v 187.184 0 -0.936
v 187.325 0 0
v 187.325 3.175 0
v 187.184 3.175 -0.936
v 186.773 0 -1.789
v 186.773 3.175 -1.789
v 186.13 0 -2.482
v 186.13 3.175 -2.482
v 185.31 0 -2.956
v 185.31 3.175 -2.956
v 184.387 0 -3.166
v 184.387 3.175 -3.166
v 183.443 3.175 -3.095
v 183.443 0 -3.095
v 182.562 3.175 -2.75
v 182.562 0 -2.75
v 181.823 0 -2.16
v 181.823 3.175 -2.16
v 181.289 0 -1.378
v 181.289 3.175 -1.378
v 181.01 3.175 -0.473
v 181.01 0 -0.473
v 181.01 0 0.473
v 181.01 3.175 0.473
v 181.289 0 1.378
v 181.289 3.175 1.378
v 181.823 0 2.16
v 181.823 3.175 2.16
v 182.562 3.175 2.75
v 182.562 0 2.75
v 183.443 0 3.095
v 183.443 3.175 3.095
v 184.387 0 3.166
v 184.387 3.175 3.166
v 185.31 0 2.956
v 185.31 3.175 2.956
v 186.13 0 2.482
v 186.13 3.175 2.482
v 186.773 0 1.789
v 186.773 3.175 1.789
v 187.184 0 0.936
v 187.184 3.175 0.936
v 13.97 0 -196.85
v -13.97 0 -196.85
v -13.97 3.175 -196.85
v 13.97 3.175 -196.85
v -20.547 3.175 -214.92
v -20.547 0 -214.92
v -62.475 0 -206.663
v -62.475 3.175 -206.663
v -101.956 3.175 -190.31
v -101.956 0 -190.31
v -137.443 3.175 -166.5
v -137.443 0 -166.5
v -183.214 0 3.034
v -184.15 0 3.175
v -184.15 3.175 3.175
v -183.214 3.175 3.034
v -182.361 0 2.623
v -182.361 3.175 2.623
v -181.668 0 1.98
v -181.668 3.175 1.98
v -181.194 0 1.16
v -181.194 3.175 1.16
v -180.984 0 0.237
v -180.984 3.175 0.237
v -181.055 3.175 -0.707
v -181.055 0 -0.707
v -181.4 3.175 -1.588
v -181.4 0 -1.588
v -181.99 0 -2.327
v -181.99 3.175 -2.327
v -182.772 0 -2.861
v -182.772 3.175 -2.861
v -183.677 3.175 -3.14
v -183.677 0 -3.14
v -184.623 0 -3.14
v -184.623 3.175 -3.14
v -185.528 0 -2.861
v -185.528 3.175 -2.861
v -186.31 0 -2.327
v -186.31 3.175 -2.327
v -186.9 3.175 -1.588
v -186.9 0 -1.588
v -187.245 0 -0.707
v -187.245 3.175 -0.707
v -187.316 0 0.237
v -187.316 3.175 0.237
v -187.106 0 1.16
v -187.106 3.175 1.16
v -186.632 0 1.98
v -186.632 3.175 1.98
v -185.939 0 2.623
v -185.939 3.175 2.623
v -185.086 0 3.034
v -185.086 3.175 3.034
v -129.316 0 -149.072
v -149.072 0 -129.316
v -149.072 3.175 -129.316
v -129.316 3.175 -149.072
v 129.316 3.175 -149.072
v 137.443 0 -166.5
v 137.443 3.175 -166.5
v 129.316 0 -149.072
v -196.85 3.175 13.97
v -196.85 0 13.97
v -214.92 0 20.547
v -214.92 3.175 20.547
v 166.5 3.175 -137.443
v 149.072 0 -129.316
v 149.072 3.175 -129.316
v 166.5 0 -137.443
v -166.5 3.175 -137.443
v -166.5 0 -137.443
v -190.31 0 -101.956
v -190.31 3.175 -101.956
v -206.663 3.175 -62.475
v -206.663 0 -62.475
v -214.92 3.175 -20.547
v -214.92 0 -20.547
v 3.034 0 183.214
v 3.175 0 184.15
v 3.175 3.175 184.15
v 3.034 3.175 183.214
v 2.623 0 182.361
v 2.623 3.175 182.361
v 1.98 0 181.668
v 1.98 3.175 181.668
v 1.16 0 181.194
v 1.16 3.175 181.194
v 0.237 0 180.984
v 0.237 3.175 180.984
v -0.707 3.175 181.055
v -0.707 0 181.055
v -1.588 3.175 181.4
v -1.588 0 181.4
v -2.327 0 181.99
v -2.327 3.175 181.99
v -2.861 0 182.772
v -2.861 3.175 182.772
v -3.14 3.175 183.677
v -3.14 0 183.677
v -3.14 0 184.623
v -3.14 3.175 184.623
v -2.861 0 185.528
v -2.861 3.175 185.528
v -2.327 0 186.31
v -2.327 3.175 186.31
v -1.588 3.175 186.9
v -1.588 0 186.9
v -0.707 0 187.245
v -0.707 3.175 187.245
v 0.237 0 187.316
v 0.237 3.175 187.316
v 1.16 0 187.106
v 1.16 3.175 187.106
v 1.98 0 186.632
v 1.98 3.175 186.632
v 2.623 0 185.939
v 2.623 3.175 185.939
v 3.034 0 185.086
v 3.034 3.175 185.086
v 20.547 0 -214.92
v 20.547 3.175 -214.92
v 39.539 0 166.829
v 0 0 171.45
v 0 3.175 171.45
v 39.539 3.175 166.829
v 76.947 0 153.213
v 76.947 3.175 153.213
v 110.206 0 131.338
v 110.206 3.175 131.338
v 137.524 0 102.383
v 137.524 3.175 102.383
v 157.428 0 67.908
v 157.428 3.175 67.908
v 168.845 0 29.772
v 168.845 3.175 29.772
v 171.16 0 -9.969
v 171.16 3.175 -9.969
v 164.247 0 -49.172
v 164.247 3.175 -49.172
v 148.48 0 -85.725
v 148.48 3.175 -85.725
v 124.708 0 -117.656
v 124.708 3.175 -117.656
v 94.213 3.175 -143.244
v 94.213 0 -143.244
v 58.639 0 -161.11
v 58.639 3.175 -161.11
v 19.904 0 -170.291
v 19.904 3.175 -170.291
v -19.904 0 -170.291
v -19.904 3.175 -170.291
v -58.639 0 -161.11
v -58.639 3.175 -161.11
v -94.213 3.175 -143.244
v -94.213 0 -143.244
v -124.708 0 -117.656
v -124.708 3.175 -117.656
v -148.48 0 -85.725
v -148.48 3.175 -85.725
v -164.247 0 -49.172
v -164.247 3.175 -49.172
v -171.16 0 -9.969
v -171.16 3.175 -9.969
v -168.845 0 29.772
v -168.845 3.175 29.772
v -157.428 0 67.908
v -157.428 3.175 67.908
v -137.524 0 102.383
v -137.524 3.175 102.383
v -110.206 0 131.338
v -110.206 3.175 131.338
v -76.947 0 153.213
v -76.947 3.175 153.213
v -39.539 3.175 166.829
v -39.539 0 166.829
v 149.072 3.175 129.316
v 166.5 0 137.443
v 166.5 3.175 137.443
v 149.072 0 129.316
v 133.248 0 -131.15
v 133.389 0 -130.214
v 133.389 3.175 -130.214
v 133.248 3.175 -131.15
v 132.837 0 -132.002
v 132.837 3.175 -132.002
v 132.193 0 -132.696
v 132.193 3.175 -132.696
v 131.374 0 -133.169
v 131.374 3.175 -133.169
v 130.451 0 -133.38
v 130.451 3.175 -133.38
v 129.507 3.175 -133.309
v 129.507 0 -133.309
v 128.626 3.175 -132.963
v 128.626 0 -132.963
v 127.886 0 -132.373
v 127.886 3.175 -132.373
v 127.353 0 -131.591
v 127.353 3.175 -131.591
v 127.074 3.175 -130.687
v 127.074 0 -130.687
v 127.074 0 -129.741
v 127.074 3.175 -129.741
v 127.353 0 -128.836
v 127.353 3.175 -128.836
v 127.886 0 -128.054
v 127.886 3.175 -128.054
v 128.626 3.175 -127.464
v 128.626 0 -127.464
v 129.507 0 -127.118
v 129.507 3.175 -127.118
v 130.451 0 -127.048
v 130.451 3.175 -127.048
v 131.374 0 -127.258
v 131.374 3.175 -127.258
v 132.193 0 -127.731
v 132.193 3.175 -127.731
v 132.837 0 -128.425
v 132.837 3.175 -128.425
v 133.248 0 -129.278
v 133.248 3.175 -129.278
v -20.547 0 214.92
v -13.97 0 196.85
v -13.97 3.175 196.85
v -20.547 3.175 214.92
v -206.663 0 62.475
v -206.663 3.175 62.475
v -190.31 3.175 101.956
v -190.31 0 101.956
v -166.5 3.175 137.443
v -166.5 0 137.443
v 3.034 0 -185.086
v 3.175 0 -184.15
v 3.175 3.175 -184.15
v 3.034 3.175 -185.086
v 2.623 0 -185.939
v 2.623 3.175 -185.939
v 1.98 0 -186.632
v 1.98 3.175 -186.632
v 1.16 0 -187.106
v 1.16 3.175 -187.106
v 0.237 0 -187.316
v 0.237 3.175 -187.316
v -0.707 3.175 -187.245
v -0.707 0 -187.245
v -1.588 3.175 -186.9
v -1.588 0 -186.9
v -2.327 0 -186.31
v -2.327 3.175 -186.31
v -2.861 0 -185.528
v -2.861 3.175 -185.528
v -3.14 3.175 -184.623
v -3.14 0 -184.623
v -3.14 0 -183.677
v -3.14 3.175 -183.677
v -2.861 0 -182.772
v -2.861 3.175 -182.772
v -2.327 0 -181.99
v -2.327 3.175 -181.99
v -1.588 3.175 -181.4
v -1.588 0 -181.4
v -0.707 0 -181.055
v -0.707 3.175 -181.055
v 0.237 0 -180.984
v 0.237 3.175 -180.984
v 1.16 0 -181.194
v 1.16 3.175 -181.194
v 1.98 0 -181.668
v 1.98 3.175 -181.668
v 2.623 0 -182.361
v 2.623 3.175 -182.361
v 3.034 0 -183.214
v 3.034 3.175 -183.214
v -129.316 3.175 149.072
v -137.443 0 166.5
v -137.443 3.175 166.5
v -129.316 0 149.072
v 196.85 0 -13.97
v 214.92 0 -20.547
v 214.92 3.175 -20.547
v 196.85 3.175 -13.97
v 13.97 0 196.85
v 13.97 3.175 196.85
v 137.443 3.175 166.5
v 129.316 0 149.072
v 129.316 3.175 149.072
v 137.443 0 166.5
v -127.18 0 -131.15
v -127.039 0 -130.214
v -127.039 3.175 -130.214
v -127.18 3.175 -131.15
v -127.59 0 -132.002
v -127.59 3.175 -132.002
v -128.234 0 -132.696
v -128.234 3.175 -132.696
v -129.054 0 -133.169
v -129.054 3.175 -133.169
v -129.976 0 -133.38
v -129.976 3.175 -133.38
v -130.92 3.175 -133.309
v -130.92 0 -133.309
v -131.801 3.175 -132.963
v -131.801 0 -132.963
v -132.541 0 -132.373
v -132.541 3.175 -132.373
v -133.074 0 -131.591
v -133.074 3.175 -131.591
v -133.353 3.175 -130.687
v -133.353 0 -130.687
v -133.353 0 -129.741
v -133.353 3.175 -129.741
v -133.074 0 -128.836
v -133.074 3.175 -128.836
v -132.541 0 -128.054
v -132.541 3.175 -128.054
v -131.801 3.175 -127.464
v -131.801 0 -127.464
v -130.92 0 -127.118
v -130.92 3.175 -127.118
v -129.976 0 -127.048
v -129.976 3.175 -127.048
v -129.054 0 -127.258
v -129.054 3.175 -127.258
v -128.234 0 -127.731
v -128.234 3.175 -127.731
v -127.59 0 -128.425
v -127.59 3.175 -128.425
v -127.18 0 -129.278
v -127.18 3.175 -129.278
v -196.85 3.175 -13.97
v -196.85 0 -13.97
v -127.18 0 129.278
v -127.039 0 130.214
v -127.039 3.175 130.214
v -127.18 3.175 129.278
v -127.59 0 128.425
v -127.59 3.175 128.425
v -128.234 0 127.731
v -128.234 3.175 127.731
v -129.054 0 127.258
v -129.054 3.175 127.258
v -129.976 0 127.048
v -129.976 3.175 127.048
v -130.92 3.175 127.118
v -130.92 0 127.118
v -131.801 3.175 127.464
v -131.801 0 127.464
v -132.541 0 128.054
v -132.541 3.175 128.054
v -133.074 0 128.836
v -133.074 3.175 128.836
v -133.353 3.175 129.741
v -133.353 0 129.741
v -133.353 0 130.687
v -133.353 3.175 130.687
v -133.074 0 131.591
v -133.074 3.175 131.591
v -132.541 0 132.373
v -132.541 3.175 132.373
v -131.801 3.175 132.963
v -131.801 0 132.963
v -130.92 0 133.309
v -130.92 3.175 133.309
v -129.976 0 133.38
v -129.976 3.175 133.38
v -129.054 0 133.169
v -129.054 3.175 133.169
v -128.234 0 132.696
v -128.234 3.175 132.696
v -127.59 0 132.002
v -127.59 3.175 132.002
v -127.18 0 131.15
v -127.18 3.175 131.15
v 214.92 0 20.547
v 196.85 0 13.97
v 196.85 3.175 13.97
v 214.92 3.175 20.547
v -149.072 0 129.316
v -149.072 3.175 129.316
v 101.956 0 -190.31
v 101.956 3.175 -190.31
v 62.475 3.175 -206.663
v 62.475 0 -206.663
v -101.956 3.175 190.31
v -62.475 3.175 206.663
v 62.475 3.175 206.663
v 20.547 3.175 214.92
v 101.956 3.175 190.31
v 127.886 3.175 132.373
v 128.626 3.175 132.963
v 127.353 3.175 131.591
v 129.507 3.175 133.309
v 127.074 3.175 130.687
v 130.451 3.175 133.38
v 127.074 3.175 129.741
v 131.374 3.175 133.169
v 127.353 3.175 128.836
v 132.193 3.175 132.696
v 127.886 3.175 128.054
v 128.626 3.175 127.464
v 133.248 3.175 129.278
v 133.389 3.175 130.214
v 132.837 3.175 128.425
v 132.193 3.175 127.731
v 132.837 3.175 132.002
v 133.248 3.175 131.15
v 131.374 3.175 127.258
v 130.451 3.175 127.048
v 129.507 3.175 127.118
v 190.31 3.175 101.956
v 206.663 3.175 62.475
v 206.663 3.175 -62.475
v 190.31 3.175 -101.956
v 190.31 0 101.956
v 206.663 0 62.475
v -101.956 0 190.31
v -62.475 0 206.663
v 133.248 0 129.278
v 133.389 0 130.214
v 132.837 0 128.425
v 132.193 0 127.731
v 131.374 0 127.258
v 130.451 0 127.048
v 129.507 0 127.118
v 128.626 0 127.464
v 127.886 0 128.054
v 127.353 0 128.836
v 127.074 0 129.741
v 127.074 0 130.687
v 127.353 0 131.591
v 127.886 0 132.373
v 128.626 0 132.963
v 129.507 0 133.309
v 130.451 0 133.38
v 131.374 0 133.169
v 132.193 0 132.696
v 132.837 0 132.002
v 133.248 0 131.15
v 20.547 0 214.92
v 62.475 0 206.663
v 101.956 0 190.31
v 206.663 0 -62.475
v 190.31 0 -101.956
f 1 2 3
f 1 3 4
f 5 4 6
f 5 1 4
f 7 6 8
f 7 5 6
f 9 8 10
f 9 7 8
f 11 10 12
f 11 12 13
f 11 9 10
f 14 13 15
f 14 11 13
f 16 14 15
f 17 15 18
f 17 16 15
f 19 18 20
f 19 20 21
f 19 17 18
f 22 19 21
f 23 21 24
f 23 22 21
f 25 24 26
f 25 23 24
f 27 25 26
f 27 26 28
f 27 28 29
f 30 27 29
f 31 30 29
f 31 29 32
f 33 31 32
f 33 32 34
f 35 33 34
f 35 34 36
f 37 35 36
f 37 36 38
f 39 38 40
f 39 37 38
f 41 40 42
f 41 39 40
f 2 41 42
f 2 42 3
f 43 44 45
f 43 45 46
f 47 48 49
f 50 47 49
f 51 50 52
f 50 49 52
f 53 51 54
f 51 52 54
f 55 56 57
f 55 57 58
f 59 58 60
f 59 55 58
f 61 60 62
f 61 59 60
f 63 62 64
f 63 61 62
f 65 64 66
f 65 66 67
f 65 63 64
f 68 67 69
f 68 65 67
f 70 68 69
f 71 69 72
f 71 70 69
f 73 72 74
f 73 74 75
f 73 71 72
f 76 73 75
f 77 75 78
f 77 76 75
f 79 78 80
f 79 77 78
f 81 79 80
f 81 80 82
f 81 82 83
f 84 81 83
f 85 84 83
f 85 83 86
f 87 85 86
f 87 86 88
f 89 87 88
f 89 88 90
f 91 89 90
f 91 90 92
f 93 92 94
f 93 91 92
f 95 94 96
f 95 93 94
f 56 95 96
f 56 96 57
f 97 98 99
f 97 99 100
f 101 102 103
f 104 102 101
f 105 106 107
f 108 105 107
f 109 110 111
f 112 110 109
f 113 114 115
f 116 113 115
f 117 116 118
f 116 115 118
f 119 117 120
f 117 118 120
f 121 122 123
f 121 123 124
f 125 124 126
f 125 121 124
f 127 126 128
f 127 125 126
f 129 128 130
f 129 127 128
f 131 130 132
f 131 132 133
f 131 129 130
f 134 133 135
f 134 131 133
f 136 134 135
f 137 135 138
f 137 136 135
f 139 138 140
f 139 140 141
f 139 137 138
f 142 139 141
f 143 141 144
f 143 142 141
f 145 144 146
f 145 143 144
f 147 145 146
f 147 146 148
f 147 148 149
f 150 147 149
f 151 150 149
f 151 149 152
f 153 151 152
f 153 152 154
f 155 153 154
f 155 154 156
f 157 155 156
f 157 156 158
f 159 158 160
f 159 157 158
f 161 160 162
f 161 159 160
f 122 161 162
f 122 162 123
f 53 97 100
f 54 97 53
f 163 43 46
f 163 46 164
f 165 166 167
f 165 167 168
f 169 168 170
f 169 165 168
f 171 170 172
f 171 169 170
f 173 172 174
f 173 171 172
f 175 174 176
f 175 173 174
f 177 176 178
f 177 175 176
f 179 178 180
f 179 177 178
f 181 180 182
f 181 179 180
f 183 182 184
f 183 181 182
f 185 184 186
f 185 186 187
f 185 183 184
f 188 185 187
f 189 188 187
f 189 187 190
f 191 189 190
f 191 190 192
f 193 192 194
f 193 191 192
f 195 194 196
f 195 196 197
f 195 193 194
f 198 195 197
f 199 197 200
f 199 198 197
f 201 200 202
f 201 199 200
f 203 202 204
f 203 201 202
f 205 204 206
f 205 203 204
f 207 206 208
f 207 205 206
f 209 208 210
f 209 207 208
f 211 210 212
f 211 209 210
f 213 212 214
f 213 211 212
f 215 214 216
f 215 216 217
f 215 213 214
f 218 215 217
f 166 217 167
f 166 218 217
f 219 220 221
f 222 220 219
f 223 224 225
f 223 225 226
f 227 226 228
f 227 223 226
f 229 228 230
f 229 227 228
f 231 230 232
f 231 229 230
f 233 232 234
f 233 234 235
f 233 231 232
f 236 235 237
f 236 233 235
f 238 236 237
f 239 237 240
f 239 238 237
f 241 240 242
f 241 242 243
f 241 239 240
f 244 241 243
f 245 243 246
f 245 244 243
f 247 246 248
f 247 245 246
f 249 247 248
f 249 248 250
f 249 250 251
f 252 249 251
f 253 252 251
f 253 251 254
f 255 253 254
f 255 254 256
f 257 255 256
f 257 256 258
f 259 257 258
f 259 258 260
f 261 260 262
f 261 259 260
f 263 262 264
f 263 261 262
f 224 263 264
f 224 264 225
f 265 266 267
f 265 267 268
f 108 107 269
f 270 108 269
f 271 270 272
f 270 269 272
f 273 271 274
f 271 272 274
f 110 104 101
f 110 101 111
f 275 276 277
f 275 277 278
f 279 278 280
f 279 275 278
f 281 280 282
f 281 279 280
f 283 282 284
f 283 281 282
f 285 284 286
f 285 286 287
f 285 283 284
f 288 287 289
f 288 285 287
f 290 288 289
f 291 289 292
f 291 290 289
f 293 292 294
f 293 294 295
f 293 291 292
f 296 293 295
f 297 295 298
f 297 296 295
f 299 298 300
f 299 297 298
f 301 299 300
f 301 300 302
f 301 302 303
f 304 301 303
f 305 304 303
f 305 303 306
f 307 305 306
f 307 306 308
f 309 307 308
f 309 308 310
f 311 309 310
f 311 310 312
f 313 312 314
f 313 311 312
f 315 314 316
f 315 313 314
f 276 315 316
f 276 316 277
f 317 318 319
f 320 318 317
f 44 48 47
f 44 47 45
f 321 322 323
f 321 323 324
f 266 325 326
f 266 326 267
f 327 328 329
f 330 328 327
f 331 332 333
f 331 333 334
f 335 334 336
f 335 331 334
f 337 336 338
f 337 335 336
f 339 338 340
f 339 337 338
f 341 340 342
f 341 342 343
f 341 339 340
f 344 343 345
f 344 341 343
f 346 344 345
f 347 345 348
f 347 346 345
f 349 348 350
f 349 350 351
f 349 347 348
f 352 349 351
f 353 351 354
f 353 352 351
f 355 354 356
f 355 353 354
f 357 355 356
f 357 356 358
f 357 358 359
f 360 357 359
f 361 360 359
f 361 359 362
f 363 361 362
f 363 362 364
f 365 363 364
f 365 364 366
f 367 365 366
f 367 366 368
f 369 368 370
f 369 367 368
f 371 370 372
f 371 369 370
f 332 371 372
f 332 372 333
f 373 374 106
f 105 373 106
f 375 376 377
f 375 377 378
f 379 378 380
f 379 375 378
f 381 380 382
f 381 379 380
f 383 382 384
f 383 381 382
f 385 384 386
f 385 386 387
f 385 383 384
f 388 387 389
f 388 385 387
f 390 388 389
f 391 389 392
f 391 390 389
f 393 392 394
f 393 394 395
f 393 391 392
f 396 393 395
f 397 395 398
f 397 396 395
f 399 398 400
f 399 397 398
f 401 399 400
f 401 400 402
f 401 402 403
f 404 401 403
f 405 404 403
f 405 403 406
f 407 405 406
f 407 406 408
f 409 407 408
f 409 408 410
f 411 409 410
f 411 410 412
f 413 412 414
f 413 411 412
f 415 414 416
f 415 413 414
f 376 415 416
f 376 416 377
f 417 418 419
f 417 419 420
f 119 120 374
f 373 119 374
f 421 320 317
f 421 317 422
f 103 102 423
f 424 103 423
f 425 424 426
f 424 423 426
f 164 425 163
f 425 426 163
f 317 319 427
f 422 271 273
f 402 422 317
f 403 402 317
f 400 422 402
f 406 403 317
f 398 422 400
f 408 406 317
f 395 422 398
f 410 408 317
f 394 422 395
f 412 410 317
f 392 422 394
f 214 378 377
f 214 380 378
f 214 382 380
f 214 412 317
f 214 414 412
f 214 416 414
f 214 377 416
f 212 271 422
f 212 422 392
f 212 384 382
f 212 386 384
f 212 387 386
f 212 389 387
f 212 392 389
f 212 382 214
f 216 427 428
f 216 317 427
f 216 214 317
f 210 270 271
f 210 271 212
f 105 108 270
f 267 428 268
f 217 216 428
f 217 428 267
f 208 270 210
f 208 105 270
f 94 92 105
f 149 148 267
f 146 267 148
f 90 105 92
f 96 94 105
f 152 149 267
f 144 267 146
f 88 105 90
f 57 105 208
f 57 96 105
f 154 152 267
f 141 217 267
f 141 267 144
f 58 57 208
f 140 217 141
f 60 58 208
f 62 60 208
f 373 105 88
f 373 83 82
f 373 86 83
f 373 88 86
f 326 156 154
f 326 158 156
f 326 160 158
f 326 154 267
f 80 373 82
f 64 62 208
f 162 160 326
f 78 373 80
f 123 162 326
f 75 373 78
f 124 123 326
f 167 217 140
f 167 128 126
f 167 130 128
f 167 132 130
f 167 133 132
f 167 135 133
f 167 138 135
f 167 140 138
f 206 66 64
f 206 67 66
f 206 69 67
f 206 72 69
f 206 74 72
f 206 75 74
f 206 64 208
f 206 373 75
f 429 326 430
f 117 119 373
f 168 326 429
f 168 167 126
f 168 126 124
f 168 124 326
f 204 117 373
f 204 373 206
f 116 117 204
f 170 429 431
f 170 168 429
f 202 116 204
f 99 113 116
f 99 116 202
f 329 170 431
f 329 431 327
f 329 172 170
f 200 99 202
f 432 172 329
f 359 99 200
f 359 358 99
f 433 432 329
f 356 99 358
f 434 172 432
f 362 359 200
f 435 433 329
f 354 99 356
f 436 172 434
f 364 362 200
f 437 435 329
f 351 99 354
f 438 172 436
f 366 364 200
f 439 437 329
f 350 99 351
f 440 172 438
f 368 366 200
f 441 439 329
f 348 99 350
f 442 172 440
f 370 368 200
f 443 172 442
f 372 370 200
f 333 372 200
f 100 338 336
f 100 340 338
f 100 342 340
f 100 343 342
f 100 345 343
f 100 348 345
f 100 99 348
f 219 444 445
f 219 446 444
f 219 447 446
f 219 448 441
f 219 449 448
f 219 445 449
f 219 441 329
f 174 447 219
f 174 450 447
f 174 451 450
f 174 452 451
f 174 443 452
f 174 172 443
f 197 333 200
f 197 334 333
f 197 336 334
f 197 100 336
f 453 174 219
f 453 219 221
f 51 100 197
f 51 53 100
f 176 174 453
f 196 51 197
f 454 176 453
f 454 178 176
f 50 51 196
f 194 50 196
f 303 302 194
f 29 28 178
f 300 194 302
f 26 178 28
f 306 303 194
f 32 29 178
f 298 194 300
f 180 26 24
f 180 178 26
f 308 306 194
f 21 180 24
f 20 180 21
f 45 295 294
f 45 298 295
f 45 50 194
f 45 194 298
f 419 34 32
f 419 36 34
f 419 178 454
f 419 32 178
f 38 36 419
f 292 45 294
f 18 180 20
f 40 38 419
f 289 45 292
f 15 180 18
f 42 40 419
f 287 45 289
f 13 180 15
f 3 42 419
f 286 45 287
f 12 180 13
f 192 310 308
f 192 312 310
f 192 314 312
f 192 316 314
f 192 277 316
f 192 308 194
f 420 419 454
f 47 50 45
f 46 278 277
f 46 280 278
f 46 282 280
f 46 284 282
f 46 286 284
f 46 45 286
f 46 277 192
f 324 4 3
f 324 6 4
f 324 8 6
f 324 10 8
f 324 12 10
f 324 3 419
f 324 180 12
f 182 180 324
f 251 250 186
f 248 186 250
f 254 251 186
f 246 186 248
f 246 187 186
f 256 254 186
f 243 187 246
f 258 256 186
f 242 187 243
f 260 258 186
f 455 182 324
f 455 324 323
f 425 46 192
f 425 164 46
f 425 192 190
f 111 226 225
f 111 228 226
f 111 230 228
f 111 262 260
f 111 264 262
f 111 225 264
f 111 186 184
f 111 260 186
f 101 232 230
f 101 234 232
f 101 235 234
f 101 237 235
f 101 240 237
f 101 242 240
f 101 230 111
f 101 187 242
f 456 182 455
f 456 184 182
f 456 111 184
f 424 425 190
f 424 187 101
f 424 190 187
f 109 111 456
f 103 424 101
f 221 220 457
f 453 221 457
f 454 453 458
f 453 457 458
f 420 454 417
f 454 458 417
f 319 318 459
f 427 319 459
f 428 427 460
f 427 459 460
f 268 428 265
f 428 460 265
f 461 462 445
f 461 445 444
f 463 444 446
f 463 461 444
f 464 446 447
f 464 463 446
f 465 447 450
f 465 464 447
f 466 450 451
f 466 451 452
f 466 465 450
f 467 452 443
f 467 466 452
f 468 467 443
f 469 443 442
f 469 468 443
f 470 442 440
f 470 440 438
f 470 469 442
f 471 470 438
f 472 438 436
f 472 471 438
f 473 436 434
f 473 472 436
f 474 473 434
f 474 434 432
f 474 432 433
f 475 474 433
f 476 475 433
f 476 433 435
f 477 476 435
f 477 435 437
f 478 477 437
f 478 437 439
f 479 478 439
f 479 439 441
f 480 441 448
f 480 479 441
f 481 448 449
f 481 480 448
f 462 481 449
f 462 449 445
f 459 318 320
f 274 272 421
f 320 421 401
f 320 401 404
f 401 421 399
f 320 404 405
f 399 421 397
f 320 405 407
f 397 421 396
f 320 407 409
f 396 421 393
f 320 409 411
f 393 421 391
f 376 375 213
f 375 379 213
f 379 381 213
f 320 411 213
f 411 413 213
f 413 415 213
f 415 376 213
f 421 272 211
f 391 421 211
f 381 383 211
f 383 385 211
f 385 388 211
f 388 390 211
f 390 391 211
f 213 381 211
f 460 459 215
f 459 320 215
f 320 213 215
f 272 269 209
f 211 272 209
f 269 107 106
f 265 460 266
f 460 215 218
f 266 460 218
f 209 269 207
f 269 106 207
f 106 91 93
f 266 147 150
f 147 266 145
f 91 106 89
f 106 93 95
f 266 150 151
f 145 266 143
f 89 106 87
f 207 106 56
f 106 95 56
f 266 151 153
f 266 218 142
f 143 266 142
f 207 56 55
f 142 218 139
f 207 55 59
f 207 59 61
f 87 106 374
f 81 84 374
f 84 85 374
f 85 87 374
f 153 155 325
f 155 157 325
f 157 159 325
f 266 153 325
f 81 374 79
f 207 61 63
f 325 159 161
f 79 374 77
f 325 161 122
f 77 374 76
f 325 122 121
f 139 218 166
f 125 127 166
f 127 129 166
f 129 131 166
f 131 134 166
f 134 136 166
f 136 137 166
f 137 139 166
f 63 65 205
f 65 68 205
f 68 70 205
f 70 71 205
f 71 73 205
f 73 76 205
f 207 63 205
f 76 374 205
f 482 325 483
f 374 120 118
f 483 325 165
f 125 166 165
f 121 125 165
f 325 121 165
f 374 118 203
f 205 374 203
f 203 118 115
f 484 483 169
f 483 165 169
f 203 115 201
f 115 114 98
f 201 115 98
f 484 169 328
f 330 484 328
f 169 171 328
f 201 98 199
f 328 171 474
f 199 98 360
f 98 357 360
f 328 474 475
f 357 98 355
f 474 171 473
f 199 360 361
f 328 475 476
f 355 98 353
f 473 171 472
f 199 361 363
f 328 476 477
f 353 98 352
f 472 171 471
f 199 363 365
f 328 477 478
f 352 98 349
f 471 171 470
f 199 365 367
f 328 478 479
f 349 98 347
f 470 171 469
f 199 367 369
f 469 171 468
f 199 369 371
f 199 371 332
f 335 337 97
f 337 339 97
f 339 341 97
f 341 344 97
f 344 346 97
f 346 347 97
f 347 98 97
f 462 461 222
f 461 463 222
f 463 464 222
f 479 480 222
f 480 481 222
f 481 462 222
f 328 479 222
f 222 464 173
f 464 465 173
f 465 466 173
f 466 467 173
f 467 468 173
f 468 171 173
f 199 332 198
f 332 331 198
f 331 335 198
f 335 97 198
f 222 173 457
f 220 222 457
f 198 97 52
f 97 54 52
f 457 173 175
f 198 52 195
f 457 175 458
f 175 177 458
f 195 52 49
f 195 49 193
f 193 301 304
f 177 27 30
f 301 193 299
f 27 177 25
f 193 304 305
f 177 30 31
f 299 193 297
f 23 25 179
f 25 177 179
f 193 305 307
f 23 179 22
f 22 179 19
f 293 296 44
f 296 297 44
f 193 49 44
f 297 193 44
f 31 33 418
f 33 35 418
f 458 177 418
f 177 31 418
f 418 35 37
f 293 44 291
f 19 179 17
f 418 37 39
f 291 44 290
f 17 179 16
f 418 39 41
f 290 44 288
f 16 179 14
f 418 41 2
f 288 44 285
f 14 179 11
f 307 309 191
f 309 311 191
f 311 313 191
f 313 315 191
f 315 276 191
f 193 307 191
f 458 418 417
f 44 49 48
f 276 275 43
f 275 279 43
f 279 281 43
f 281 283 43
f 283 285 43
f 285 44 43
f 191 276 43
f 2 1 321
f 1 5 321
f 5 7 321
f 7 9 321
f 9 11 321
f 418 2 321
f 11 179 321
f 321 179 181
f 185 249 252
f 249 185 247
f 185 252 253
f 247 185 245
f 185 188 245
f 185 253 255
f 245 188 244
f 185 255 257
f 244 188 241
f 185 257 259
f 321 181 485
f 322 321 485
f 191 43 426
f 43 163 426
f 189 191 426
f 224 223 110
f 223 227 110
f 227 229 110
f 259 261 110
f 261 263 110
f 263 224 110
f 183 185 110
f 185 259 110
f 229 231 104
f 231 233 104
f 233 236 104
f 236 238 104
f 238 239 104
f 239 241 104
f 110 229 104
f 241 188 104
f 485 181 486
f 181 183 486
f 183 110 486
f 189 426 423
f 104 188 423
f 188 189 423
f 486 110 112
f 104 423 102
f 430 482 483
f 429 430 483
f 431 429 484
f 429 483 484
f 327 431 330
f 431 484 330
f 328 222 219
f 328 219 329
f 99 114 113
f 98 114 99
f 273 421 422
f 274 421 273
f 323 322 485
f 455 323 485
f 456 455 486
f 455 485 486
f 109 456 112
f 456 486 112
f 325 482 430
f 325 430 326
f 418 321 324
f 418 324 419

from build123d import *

# Parameters (mm, degrees)
SKETCH2_R             = 3.175
SKETCH2_R_2           = 171.45
BOSS_EXTRUDE1_DEPTH   = 3.175
CIRPATTERN1_OUTLINE_R = 3.175
CIRPATTERN1_DEPTH     = 3.175


# Read off the part's stored shape, not the designer's step: CirPattern1
with BuildPart() as part:
    # Sketch2 → Boss-Extrude1 (new body)
    with BuildSketch(Plane(origin=(0, 0, 0), x_dir=(1, 0, 0), z_dir=(0, 1, 0))):
        with BuildLine():
            Line((-214.920060182, 20.546964038), (-196.85, 13.97))
            Line((-196.85, 13.97), (-196.85, -13.97))
            Line((-196.85, -13.97), (-214.920060182, -20.546964038))
            ThreePointArc((-214.920060182, -20.546964038), (10.285159372, -215.654875894), (215.9, 0))
            ThreePointArc((215.9, 0), (10.285159372, 215.654875894), (-214.920060182, 20.546964038))
        make_face()
        with Locations(Location((-184.15, 0, 0), (0, 0, 270))):
            Circle(SKETCH2_R, mode=Mode.SUBTRACT)
        with Locations(Location((0, 0, 0), (0, 0, 270))):
            Circle(SKETCH2_R_2, mode=Mode.SUBTRACT)
    extrude(amount=BOSS_EXTRUDE1_DEPTH)

    # CirPattern1 outline → CirPattern1 (cut)
    with BuildSketch(Plane(origin=(0, 0, 0), x_dir=(1, 0, 0), z_dir=(0, 1, 0))):
        with BuildLine():
            Line((-129.315688143, 149.07225161), (-137.442534364, 166.500329572))
            ThreePointArc((-137.442534364, 166.500329572), (-152.664354058, 152.664354058), (-166.500329572, 137.442534364))
            Line((-166.500329572, 137.442534364), (-149.07225161, 129.315688143))
            Line((-149.07225161, 129.315688143), (-129.315688143, 149.07225161))
        make_face()
        with BuildLine():
            ThreePointArc((-166.500329572, -137.442534364), (-152.664354058, -152.664354058), (-137.442534364, -166.500329572))
            Line((-137.442534364, -166.500329572), (-129.315688143, -149.07225161))
            Line((-129.315688143, -149.07225161), (-149.07225161, -129.315688143))
            Line((-149.07225161, -129.315688143), (-166.500329572, -137.442534364))
        make_face()
        with BuildLine():
            ThreePointArc((-20.546964038, -214.920060182), (0, -215.9), (20.546964038, -214.920060182))
            Line((20.546964038, -214.920060182), (13.97, -196.85))
            Line((13.97, -196.85), (-13.97, -196.85))
            Line((-13.97, -196.85), (-20.546964038, -214.920060182))
        make_face()
        with BuildLine():
            ThreePointArc((137.442534364, -166.500329572), (152.664354058, -152.664354058), (166.500329572, -137.442534364))
            Line((166.500329572, -137.442534364), (149.07225161, -129.315688143))
            Line((149.07225161, -129.315688143), (129.315688143, -149.07225161))
            Line((129.315688143, -149.07225161), (137.442534364, -166.500329572))
        make_face()
        with BuildLine():
            ThreePointArc((214.920060182, -20.546964038), (215.9, 0), (214.920060182, 20.546964038))
            Line((214.920060182, 20.546964038), (196.85, 13.97))
            Line((196.85, 13.97), (196.85, -13.97))
            Line((196.85, -13.97), (214.920060182, -20.546964038))
        make_face()
        with BuildLine():
            ThreePointArc((166.500329572, 137.442534364), (152.664354058, 152.664354058), (137.442534364, 166.500329572))
            Line((137.442534364, 166.500329572), (129.315688143, 149.07225161))
            Line((129.315688143, 149.07225161), (149.07225161, 129.315688143))
            Line((149.07225161, 129.315688143), (166.500329572, 137.442534364))
        make_face()
        with BuildLine():
            ThreePointArc((20.546964038, 214.920060182), (0, 215.9), (-20.546964038, 214.920060182))
            Line((-20.546964038, 214.920060182), (-13.97, 196.85))
            Line((-13.97, 196.85), (13.97, 196.85))
            Line((13.97, 196.85), (20.546964038, 214.920060182))
        make_face()
        with Locations((-130.213713756, 130.213713756)):
            Circle(CIRPATTERN1_OUTLINE_R)
        with Locations((0, 184.15)):
            Circle(CIRPATTERN1_OUTLINE_R)
        with Locations((130.213713756, 130.213713756)):
            Circle(CIRPATTERN1_OUTLINE_R)
        with Locations((184.15, 0)):
            Circle(CIRPATTERN1_OUTLINE_R)
        with Locations((130.213713756, -130.213713756)):
            Circle(CIRPATTERN1_OUTLINE_R)
        with Locations((0, -184.15)):
            Circle(CIRPATTERN1_OUTLINE_R)
        with Locations((-130.213713756, -130.213713756)):
            Circle(CIRPATTERN1_OUTLINE_R)
    extrude(amount=CIRPATTERN1_DEPTH, mode=Mode.SUBTRACT)


solid = part.part
